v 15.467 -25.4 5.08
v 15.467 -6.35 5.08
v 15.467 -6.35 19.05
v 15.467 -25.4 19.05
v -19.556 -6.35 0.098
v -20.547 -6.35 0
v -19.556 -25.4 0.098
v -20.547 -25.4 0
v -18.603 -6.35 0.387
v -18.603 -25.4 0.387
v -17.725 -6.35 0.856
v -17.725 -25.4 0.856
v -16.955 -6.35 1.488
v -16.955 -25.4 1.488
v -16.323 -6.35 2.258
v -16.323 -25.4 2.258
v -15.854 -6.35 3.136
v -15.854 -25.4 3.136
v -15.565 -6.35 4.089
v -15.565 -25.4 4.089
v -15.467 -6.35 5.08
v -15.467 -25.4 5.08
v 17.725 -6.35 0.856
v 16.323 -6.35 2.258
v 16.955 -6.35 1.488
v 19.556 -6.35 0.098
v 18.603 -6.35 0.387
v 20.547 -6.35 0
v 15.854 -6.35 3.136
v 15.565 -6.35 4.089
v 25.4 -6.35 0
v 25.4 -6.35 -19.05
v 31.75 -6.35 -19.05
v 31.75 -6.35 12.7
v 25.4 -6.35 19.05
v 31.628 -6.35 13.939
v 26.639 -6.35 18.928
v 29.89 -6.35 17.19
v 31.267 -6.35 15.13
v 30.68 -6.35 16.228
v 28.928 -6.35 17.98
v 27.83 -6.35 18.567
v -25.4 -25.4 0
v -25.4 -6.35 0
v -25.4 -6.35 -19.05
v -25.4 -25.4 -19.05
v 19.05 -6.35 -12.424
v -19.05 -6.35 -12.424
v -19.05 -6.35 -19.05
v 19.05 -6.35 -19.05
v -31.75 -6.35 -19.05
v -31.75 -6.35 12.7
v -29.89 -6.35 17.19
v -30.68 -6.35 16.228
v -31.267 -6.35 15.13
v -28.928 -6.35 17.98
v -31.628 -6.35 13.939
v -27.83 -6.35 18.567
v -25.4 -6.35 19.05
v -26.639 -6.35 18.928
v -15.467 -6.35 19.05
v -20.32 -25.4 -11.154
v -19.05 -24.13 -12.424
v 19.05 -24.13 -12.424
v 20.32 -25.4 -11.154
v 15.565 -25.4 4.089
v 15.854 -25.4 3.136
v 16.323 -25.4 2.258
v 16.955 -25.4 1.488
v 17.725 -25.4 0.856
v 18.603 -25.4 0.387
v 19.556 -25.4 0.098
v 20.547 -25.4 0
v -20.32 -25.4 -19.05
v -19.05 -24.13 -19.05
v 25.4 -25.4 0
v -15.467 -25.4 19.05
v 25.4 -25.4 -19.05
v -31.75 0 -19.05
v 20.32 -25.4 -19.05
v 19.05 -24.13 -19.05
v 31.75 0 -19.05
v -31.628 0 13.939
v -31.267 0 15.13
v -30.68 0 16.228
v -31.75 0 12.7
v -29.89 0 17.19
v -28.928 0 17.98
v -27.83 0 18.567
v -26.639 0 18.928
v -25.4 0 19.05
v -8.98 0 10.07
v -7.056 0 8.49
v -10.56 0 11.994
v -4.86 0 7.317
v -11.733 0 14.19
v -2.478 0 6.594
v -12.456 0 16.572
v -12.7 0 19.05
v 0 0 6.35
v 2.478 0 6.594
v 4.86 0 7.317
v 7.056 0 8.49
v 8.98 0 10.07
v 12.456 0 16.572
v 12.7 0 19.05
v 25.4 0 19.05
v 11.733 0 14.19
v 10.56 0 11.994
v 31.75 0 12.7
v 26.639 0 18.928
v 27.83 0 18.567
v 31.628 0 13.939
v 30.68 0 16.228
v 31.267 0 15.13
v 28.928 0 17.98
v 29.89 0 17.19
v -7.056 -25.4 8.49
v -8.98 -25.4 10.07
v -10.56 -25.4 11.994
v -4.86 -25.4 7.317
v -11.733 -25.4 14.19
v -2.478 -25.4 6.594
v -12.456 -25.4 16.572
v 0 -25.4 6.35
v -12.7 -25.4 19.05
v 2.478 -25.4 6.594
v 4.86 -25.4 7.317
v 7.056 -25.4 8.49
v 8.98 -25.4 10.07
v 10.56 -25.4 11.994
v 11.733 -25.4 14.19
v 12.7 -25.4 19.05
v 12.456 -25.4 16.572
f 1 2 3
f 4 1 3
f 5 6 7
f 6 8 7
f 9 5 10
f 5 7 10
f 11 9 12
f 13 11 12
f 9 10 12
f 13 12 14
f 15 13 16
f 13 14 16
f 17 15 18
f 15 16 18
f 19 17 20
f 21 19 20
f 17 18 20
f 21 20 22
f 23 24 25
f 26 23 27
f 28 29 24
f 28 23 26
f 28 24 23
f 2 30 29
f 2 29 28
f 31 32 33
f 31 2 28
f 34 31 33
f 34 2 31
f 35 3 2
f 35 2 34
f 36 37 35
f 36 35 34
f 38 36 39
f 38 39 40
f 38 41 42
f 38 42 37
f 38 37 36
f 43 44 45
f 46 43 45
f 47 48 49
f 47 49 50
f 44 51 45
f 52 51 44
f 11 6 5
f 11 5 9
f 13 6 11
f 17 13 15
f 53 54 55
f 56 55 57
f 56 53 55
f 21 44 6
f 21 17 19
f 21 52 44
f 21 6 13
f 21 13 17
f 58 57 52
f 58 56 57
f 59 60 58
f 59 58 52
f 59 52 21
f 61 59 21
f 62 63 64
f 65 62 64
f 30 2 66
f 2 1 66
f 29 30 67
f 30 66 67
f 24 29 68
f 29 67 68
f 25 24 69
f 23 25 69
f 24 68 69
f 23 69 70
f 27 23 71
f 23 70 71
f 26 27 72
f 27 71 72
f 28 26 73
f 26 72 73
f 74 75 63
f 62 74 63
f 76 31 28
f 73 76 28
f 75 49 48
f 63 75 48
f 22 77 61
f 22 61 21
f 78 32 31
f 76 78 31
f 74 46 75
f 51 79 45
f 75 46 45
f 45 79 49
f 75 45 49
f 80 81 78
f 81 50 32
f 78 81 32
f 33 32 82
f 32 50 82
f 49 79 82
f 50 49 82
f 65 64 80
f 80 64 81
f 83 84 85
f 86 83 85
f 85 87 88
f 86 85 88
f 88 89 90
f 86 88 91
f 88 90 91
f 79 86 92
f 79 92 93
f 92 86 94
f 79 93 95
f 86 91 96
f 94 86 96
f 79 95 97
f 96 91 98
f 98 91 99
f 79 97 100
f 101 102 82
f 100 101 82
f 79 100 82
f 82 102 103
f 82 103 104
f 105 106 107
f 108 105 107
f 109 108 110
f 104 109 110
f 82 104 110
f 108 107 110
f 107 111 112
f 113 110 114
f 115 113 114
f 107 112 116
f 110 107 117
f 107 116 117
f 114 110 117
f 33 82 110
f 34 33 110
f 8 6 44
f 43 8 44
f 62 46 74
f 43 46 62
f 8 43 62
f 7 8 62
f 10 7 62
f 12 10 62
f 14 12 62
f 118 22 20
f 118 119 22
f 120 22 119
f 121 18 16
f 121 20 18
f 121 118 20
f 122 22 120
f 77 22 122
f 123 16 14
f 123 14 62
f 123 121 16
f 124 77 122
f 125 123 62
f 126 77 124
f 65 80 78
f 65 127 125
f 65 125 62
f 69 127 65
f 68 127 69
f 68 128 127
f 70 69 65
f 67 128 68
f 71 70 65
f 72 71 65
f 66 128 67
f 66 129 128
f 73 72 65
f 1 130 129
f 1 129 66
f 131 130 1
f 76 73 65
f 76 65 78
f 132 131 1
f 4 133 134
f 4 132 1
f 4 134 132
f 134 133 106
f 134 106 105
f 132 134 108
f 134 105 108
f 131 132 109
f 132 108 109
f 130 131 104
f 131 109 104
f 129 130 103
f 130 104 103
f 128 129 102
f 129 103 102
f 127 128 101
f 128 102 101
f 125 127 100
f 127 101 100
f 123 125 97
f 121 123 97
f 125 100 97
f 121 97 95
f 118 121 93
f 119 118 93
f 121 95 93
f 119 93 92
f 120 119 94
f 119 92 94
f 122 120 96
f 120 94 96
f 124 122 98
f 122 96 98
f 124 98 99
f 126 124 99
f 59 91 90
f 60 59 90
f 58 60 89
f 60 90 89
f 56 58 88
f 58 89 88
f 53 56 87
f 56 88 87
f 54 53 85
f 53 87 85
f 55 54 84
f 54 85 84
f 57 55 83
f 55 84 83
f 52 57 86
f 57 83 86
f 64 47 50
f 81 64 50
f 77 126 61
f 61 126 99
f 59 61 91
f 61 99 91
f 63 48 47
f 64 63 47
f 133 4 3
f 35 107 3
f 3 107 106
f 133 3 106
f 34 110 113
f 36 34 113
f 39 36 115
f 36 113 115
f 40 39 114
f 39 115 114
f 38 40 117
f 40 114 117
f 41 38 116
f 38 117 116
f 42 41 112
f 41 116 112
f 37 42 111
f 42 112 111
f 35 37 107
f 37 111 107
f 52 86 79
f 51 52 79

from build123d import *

# Parameters (mm, degrees)
F1_DEPTH = 6.35
F3_DEPTH = 19.05
F4_R     = 5.08
F5_SIZE  = 1.27


with BuildPart() as f1:
    # F0 (on Front) → F1 (new body)
    with BuildSketch(Plane.XZ):
        with BuildLine():
            Line((-12.7, 19.05), (-25.4, 19.05))
            ThreePointArc((-25.4, 19.05), (-29.890128, 17.190128), (-31.75, 12.7))
            Line((-31.75, 12.7), (-31.75, -19.05))
            Line((-31.75, -19.05), (31.75, -19.05))
            Line((31.75, -19.05), (31.75, 12.7))
            ThreePointArc((31.75, 12.7), (29.890128, 17.190128), (25.4, 19.05))
            Line((25.4, 19.05), (12.7, 19.05))
            ThreePointArc((12.7, 19.05), (0, 6.35), (-12.7, 19.05))
        make_face()
    extrude(amount=F1_DEPTH)

    # F2 (on face) → F3 (join)
    with BuildSketch(Plane.XZ.offset(6.35)):
        with BuildLine():
            ThreePointArc((12.7, 19.05), (0, 6.35), (-12.7, 19.05))
            Line((-12.7, 19.05), (-15.467166, 19.05))
            Line((-15.467166, 19.05), (-15.467166, 0))
            Line((-15.467166, 0), (-25.4, 0))
            Line((-25.4, 0), (-25.4, -19.05))
            Line((-25.4, -19.05), (-19.05, -19.05))
            Line((-19.05, -19.05), (-19.05, -12.423539))
            Line((-19.05, -12.423539), (19.05, -12.423539))
            Line((19.05, -12.423539), (19.05, -19.05))
            Line((19.05, -19.05), (25.4, -19.05))
            Line((25.4, -19.05), (25.4, 0))
            Line((25.4, 0), (15.467166, 0))
            Line((15.467166, 0), (15.467166, 19.05))
            Line((15.467166, 19.05), (12.7, 19.05))
        make_face()
    extrude(amount=F3_DEPTH)

    # F4
    f4_edges = [f1.edges().sort_by_distance(p)[0] for p in [
        (-15.467166, -15.875, 0),
        (15.467166, -15.875, 0),
    ]]
    fillet(f4_edges, radius=F4_R)

    # F5
    f5_edges = [f1.edges().sort_by_distance(p)[0] for p in [
        (0, -25.4, -12.423539),
        (-19.05, -25.4, -15.736769),
        (19.05, -25.4, -15.736769),
    ]]
    chamfer(f5_edges, length=F5_SIZE)


solid = f1.part
